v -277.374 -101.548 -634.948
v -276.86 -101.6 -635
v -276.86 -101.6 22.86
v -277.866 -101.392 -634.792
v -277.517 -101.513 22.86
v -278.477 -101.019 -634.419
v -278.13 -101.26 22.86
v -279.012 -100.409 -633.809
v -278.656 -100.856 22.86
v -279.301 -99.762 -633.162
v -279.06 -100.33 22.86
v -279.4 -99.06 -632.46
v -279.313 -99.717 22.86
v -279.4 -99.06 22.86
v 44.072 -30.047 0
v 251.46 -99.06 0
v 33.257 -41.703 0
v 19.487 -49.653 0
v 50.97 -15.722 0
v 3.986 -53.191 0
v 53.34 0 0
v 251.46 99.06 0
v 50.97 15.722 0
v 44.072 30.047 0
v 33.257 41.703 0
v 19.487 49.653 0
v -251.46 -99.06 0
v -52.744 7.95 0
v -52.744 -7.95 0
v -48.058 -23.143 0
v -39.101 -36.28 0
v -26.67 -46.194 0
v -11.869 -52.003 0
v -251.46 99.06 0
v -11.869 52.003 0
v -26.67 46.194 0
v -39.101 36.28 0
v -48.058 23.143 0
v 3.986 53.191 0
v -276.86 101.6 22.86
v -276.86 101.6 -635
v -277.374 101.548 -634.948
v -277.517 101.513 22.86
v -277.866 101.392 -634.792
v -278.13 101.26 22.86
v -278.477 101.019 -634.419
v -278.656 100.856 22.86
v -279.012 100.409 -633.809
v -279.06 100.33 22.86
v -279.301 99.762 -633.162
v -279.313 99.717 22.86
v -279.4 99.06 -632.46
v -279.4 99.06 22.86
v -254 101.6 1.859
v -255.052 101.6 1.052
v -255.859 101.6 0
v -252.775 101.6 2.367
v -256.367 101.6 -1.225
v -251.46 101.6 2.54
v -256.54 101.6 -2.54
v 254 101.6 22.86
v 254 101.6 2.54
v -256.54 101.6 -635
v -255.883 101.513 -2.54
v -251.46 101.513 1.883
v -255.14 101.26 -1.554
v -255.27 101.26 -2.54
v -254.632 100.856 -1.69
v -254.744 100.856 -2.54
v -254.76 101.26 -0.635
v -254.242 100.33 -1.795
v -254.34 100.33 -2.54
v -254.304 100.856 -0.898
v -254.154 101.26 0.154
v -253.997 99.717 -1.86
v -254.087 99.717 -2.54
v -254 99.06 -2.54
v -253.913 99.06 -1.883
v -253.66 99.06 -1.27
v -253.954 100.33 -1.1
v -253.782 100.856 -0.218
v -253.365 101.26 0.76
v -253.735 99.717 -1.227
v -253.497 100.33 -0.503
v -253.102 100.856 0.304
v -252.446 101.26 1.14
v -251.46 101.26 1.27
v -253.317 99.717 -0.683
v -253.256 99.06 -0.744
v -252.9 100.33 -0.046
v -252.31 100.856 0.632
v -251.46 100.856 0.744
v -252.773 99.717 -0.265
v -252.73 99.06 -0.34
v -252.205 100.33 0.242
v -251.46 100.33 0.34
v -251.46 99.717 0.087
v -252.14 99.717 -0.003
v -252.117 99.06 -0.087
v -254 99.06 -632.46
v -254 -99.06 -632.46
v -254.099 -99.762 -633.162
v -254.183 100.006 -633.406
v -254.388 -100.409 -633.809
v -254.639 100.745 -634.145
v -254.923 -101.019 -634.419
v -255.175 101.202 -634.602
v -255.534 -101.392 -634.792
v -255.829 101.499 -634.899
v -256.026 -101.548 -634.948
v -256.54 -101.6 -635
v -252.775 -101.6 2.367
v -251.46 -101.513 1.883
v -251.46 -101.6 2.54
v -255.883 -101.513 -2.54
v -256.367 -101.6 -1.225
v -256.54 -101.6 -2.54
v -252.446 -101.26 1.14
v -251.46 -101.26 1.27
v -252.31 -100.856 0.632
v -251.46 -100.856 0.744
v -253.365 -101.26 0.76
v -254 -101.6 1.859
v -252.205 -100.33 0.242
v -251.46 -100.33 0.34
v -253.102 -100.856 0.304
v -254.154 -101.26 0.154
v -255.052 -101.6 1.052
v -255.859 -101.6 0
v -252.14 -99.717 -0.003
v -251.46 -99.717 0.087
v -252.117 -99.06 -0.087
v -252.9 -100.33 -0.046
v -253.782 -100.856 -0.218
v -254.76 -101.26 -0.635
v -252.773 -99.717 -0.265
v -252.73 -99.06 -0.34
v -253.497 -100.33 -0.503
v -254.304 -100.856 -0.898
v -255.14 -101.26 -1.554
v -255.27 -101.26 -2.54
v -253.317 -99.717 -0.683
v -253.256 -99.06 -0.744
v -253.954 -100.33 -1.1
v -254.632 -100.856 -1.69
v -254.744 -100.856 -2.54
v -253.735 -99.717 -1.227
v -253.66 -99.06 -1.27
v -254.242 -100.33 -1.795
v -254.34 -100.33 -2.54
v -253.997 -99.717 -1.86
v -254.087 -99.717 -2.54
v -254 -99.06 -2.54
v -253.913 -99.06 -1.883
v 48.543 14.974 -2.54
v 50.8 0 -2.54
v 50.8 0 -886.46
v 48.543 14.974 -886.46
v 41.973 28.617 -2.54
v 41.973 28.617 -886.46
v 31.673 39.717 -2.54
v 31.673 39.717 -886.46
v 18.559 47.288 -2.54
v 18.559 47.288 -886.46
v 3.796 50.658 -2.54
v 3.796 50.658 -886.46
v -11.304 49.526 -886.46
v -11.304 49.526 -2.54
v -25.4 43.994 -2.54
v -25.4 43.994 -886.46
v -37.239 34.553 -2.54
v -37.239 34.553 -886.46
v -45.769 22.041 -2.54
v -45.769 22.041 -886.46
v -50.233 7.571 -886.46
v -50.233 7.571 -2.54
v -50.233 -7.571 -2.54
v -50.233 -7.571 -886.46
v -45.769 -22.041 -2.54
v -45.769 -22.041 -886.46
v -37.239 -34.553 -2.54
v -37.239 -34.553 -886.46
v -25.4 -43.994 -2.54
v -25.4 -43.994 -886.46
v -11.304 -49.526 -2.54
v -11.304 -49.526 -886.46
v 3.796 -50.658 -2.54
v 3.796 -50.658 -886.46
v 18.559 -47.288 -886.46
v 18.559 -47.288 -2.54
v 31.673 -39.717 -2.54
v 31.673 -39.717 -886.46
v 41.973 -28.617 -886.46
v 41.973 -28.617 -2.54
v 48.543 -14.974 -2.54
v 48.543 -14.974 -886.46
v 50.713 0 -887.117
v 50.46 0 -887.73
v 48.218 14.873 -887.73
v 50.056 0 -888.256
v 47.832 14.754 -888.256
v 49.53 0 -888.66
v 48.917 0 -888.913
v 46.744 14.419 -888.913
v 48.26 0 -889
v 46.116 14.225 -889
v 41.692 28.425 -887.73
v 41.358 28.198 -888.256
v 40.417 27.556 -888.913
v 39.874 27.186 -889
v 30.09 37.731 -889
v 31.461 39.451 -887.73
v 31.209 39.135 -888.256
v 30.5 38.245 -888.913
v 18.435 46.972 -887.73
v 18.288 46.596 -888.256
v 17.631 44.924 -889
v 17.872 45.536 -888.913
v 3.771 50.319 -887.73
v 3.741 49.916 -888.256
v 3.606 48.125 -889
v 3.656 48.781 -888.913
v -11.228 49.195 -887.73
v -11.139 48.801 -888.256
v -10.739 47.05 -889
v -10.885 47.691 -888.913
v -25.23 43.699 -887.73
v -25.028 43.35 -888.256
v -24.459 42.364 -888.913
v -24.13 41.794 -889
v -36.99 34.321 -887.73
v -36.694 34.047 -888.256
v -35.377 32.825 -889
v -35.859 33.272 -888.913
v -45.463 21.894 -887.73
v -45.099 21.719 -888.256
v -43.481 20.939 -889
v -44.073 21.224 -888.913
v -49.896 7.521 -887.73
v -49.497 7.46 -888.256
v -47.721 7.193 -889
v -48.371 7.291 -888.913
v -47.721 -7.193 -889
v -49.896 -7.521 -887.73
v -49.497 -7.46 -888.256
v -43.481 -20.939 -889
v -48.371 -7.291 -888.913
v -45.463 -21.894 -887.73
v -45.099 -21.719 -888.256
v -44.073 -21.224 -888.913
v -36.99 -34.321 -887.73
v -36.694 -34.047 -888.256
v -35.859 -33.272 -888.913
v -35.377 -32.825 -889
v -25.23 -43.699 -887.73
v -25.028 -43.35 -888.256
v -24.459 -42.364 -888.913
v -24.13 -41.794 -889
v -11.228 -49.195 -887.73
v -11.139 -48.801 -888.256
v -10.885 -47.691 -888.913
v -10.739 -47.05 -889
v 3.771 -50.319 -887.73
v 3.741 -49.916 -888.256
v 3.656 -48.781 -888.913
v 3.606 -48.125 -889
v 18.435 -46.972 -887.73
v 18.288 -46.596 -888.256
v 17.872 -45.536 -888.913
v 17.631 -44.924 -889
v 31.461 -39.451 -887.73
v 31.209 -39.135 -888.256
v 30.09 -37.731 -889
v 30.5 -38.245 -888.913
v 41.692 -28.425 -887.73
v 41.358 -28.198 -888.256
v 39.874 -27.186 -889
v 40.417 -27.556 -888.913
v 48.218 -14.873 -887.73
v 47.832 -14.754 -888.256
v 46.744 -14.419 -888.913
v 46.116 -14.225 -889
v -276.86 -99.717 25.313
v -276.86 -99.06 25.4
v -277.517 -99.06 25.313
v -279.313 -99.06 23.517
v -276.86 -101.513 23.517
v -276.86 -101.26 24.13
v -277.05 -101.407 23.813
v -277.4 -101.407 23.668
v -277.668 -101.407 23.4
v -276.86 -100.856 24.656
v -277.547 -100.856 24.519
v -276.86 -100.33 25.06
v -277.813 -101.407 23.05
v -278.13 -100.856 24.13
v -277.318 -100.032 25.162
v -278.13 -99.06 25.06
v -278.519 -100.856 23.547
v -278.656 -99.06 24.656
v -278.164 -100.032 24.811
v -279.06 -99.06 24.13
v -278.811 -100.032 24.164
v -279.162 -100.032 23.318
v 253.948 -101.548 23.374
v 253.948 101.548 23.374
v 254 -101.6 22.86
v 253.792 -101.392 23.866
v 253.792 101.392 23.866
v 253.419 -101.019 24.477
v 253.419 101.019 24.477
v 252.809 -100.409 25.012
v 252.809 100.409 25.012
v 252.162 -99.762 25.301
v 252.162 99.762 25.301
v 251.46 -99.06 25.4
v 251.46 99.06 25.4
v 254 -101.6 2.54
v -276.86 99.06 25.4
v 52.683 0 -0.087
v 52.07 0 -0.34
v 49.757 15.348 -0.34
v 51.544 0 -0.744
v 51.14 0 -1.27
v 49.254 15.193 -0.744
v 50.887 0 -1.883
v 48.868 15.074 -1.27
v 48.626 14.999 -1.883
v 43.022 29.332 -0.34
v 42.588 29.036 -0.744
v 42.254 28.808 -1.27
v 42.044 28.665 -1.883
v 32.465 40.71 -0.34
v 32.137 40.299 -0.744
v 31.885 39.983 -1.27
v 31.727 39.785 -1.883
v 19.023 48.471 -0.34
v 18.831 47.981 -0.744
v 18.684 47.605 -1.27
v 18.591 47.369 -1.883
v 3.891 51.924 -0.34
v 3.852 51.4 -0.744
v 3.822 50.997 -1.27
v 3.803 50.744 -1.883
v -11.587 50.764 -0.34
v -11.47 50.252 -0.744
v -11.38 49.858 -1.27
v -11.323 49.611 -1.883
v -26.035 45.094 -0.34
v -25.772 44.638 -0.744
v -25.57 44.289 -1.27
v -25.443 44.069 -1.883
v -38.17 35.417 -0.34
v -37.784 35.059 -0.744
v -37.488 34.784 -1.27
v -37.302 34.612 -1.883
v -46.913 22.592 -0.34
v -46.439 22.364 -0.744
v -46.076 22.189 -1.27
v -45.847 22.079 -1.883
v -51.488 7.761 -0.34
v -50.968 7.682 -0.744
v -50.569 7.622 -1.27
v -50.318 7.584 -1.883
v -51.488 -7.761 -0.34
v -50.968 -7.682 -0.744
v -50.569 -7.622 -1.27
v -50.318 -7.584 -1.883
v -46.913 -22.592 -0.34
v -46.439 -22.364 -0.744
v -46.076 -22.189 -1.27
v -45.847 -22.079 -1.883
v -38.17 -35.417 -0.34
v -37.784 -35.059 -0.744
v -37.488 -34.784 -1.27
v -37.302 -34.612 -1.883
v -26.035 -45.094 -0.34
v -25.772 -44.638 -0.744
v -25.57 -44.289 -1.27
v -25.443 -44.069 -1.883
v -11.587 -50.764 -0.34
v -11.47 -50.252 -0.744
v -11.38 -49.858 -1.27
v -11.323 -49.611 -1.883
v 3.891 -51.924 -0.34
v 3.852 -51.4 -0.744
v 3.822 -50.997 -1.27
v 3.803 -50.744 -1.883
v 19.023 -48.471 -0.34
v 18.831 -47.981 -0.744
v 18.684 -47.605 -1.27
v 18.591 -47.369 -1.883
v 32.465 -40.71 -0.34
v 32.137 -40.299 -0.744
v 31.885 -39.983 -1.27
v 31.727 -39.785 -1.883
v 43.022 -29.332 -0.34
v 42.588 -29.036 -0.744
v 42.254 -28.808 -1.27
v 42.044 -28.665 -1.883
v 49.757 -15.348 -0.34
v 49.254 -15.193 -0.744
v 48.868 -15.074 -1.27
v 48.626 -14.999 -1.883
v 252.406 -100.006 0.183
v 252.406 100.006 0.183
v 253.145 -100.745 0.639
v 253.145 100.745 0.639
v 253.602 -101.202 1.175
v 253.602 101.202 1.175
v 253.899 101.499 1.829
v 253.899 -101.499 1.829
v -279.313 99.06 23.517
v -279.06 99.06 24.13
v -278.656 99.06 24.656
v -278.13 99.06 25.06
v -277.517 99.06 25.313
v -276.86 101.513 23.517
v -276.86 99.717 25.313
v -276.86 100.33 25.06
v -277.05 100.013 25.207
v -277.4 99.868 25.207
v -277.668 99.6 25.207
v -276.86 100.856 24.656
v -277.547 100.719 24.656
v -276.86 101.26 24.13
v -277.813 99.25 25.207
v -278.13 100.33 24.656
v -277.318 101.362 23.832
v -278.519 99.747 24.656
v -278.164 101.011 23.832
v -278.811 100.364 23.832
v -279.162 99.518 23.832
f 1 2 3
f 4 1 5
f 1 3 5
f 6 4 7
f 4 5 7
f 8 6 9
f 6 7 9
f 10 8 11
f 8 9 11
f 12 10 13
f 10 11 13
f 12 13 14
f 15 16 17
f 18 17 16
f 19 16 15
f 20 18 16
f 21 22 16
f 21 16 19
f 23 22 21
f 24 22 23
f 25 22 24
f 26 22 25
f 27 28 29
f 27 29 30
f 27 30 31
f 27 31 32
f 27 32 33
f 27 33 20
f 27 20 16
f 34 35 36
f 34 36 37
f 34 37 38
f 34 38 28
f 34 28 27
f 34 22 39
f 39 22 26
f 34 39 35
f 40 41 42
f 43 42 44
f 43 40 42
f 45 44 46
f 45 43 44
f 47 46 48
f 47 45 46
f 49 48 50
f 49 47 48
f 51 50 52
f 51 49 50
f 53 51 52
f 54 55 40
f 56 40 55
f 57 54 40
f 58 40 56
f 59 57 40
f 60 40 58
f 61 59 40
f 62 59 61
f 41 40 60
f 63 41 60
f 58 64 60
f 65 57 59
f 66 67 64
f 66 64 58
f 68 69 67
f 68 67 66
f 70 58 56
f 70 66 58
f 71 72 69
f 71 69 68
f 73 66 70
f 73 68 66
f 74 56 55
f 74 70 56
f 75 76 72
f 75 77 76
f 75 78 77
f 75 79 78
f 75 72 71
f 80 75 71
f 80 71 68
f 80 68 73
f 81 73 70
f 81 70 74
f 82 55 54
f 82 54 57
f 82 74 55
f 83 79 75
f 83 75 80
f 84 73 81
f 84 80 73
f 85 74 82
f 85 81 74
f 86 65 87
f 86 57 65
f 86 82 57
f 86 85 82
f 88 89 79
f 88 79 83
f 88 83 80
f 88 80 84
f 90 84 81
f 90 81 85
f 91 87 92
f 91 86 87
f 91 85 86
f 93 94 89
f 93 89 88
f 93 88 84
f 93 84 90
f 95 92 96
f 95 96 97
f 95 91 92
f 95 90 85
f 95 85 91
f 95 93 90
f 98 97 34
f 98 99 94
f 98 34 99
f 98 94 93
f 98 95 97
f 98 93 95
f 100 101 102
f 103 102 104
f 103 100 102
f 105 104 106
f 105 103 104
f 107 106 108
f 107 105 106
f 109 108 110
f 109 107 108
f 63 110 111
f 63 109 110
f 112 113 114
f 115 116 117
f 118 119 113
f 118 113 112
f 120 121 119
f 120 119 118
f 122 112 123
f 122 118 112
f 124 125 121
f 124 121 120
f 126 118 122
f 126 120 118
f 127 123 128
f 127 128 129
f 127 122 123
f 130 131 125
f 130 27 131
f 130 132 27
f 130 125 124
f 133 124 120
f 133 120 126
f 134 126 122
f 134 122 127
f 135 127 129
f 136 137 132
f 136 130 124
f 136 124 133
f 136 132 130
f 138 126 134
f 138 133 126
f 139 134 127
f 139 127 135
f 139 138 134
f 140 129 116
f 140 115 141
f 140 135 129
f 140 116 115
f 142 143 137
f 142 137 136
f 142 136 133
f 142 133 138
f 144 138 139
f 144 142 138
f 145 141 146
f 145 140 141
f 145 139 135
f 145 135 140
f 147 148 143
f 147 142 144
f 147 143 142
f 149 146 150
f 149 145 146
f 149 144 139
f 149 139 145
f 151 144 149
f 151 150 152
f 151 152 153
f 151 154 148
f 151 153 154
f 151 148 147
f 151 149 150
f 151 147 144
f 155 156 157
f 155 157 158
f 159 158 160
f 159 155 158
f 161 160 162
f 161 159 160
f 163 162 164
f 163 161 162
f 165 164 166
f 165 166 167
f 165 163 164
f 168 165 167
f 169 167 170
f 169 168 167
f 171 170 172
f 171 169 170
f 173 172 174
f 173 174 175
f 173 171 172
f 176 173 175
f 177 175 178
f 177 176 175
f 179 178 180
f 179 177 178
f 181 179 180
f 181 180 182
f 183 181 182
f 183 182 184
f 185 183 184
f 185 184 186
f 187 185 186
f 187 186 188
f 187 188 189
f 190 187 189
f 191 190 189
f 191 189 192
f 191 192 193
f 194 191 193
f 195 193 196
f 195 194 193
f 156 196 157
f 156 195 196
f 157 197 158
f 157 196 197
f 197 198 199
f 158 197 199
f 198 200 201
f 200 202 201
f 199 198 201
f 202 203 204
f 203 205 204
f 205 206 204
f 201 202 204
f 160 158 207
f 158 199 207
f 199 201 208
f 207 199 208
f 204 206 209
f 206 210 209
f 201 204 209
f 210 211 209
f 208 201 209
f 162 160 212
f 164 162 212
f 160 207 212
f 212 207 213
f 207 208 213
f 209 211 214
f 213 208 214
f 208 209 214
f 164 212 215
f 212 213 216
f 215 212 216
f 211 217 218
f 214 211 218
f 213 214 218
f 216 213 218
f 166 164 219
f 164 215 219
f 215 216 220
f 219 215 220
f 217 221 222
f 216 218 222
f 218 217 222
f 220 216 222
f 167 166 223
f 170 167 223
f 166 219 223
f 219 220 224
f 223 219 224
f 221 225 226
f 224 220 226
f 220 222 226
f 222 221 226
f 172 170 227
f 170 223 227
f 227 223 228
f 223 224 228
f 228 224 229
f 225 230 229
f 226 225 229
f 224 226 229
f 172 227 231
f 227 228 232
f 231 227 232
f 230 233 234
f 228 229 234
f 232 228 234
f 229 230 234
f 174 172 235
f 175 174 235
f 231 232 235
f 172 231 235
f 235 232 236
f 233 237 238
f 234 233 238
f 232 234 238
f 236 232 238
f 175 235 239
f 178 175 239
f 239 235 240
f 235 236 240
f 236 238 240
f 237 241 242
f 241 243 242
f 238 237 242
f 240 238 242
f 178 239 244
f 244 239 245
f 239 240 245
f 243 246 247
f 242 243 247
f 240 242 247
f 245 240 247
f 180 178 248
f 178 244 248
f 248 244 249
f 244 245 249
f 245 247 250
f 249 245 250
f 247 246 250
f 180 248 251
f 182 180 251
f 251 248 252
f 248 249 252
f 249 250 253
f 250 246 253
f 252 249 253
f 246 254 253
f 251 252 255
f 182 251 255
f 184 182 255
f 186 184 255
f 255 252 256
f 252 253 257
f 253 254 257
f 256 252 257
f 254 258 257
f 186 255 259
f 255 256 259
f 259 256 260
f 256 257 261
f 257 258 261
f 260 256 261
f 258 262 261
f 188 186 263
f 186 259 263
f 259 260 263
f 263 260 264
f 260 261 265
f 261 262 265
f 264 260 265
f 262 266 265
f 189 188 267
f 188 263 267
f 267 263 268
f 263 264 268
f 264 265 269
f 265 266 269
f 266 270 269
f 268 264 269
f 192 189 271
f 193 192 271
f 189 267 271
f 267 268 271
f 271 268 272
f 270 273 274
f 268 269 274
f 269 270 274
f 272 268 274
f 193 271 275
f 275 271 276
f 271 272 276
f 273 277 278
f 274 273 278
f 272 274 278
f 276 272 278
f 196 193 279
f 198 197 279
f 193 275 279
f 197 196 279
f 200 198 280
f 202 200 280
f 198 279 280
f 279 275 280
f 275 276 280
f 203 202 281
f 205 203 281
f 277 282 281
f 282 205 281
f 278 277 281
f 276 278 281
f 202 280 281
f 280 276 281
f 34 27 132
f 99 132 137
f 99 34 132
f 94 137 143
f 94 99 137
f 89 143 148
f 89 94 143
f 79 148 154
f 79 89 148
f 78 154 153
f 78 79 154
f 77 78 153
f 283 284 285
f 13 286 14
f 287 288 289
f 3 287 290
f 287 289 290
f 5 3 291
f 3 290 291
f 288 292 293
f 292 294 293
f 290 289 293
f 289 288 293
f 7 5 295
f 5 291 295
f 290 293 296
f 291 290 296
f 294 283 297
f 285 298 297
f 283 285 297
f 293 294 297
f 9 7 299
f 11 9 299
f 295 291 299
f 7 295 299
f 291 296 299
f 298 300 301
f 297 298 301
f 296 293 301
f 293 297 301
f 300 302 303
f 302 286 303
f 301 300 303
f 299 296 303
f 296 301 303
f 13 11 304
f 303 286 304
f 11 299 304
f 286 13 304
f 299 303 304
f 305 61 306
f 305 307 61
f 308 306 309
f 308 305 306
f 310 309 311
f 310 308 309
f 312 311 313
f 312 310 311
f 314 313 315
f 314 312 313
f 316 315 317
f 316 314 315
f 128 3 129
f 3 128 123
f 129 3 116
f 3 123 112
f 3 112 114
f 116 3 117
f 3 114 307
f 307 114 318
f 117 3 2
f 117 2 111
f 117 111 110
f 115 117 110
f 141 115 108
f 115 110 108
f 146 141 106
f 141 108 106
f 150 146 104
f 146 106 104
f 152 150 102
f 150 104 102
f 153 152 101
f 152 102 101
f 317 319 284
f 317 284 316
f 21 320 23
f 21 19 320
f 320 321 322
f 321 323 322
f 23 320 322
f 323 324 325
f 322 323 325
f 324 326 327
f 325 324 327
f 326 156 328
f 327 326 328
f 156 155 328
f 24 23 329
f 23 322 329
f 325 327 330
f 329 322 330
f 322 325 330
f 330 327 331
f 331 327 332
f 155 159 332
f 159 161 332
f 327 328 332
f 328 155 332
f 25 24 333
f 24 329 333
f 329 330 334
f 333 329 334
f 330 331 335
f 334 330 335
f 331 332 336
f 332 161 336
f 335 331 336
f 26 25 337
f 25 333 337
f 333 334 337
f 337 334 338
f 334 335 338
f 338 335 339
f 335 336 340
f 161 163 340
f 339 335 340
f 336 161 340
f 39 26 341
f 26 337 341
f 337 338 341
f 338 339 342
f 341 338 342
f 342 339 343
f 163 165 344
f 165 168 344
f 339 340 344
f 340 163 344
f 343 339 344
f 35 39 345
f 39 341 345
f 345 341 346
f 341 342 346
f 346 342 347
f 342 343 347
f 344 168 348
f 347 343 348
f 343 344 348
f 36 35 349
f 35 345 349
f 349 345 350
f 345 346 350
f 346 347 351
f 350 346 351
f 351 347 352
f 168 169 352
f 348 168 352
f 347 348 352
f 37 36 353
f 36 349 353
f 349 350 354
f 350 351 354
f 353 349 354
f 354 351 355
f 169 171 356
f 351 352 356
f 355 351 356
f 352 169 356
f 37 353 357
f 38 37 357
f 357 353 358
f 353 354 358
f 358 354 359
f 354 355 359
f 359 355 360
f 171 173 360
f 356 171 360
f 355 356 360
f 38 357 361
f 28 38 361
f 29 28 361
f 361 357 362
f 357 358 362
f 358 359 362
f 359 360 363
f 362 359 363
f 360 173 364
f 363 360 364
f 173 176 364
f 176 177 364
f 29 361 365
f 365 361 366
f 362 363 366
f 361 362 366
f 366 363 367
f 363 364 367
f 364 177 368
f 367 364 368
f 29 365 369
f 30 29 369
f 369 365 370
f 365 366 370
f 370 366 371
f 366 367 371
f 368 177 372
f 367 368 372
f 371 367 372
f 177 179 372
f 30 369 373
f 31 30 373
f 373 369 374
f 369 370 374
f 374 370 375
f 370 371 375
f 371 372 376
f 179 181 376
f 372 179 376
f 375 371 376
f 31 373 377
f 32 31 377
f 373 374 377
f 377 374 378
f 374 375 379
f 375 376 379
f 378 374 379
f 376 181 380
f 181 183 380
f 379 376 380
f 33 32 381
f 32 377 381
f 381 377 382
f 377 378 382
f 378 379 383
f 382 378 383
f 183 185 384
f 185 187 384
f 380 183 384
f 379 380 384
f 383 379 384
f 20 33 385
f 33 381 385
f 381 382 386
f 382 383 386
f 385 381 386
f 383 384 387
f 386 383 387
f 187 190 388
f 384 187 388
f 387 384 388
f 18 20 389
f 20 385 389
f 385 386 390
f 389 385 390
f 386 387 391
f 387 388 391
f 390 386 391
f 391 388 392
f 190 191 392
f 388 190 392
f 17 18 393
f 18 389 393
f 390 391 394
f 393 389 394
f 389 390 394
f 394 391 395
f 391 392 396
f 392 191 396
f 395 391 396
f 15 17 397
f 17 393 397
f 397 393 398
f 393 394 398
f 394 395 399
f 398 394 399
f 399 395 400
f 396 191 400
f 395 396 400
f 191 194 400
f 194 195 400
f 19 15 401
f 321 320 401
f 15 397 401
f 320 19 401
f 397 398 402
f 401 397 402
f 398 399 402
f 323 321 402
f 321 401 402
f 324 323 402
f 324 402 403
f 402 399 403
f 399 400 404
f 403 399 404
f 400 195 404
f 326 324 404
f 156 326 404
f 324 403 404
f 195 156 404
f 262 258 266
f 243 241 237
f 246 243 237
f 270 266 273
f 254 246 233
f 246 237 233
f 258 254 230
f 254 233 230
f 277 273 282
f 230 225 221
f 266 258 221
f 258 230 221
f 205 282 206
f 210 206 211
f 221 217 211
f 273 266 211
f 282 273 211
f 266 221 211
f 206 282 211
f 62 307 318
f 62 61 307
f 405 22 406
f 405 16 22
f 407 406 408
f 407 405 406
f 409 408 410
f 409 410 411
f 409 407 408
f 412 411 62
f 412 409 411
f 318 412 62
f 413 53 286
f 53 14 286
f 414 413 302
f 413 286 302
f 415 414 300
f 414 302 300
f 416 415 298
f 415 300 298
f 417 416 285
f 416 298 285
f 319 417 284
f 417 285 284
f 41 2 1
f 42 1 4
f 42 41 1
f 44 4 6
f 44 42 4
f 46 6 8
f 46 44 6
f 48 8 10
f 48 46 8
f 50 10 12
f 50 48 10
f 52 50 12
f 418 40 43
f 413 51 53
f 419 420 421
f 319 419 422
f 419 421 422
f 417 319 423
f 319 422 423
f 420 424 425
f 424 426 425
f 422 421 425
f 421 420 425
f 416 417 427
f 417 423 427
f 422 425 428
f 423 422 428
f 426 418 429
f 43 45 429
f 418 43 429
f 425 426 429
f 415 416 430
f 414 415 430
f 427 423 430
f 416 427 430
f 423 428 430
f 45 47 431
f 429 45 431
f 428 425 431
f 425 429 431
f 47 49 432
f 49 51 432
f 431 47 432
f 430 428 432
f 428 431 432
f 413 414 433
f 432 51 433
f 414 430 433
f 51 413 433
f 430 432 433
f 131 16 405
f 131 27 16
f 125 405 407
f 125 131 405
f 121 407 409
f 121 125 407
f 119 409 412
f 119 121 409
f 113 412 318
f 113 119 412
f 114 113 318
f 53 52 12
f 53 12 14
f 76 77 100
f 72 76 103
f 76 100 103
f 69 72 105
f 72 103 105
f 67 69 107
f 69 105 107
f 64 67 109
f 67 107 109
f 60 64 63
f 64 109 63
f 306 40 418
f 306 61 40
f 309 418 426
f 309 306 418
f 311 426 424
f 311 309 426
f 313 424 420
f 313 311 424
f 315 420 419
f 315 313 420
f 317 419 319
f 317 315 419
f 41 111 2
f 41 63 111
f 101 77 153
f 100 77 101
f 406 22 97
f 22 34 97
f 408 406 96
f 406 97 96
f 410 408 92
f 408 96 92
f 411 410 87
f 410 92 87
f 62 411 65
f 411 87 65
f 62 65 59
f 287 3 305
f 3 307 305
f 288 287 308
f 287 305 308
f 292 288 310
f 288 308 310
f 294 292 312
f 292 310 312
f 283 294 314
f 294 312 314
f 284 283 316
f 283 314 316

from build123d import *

# Parameters (mm, degrees)
SKETCH1_R           = 50.8
BOSS_EXTRUDE1_DEPTH = 889
EXTRUDE_THIN1_DEPTH = 101.6
FILLET1_R           = 2.54


with BuildPart() as part:
    # Sketch1 → Boss-Extrude1 (new body)
    with BuildSketch(Plane.XY):
        Circle(SKETCH1_R)
    extrude(amount=-BOSS_EXTRUDE1_DEPTH)

    # Sketch3 → Extrude-Thin1 (add, symmetric)
    with BuildSketch(Plane(origin=(0, 0, 0), x_dir=(1, 0, 0), z_dir=(0, 1, 0))):
        Polygon((254, 0), (-254, 0), (-254, 635), (-279.4, 635), (-279.4, -25.4), (254, -25.4), align=None)
    extrude(amount=EXTRUDE_THIN1_DEPTH, both=True)

    # Fillet1
    fillet1_edges = [part.edges().sort_by_distance(p)[0] for p in [
        (-50.8, 0, 0),
        (-50.8, 0, -889),
        (-254, -101.6, -317.5),
        (-254, 0, 0),
        (-254, 0, -635),
        (-279.4, 101.6, -304.8),
        (-279.4, 0, -635),
        (-12.7, 101.6, 25.4),
        (-279.4, 0, 25.4),
        (254, 0, 25.4),
        (0, -101.6, 0),
        (254, 0, 0),
        (-254, 101.6, -317.5),
        (0, 101.6, 0),
        (-12.7, -101.6, 25.4),
        (-279.4, -101.6, -304.8),
    ]]
    fillet(fillet1_edges, radius=FILLET1_R)


solid = part.part
